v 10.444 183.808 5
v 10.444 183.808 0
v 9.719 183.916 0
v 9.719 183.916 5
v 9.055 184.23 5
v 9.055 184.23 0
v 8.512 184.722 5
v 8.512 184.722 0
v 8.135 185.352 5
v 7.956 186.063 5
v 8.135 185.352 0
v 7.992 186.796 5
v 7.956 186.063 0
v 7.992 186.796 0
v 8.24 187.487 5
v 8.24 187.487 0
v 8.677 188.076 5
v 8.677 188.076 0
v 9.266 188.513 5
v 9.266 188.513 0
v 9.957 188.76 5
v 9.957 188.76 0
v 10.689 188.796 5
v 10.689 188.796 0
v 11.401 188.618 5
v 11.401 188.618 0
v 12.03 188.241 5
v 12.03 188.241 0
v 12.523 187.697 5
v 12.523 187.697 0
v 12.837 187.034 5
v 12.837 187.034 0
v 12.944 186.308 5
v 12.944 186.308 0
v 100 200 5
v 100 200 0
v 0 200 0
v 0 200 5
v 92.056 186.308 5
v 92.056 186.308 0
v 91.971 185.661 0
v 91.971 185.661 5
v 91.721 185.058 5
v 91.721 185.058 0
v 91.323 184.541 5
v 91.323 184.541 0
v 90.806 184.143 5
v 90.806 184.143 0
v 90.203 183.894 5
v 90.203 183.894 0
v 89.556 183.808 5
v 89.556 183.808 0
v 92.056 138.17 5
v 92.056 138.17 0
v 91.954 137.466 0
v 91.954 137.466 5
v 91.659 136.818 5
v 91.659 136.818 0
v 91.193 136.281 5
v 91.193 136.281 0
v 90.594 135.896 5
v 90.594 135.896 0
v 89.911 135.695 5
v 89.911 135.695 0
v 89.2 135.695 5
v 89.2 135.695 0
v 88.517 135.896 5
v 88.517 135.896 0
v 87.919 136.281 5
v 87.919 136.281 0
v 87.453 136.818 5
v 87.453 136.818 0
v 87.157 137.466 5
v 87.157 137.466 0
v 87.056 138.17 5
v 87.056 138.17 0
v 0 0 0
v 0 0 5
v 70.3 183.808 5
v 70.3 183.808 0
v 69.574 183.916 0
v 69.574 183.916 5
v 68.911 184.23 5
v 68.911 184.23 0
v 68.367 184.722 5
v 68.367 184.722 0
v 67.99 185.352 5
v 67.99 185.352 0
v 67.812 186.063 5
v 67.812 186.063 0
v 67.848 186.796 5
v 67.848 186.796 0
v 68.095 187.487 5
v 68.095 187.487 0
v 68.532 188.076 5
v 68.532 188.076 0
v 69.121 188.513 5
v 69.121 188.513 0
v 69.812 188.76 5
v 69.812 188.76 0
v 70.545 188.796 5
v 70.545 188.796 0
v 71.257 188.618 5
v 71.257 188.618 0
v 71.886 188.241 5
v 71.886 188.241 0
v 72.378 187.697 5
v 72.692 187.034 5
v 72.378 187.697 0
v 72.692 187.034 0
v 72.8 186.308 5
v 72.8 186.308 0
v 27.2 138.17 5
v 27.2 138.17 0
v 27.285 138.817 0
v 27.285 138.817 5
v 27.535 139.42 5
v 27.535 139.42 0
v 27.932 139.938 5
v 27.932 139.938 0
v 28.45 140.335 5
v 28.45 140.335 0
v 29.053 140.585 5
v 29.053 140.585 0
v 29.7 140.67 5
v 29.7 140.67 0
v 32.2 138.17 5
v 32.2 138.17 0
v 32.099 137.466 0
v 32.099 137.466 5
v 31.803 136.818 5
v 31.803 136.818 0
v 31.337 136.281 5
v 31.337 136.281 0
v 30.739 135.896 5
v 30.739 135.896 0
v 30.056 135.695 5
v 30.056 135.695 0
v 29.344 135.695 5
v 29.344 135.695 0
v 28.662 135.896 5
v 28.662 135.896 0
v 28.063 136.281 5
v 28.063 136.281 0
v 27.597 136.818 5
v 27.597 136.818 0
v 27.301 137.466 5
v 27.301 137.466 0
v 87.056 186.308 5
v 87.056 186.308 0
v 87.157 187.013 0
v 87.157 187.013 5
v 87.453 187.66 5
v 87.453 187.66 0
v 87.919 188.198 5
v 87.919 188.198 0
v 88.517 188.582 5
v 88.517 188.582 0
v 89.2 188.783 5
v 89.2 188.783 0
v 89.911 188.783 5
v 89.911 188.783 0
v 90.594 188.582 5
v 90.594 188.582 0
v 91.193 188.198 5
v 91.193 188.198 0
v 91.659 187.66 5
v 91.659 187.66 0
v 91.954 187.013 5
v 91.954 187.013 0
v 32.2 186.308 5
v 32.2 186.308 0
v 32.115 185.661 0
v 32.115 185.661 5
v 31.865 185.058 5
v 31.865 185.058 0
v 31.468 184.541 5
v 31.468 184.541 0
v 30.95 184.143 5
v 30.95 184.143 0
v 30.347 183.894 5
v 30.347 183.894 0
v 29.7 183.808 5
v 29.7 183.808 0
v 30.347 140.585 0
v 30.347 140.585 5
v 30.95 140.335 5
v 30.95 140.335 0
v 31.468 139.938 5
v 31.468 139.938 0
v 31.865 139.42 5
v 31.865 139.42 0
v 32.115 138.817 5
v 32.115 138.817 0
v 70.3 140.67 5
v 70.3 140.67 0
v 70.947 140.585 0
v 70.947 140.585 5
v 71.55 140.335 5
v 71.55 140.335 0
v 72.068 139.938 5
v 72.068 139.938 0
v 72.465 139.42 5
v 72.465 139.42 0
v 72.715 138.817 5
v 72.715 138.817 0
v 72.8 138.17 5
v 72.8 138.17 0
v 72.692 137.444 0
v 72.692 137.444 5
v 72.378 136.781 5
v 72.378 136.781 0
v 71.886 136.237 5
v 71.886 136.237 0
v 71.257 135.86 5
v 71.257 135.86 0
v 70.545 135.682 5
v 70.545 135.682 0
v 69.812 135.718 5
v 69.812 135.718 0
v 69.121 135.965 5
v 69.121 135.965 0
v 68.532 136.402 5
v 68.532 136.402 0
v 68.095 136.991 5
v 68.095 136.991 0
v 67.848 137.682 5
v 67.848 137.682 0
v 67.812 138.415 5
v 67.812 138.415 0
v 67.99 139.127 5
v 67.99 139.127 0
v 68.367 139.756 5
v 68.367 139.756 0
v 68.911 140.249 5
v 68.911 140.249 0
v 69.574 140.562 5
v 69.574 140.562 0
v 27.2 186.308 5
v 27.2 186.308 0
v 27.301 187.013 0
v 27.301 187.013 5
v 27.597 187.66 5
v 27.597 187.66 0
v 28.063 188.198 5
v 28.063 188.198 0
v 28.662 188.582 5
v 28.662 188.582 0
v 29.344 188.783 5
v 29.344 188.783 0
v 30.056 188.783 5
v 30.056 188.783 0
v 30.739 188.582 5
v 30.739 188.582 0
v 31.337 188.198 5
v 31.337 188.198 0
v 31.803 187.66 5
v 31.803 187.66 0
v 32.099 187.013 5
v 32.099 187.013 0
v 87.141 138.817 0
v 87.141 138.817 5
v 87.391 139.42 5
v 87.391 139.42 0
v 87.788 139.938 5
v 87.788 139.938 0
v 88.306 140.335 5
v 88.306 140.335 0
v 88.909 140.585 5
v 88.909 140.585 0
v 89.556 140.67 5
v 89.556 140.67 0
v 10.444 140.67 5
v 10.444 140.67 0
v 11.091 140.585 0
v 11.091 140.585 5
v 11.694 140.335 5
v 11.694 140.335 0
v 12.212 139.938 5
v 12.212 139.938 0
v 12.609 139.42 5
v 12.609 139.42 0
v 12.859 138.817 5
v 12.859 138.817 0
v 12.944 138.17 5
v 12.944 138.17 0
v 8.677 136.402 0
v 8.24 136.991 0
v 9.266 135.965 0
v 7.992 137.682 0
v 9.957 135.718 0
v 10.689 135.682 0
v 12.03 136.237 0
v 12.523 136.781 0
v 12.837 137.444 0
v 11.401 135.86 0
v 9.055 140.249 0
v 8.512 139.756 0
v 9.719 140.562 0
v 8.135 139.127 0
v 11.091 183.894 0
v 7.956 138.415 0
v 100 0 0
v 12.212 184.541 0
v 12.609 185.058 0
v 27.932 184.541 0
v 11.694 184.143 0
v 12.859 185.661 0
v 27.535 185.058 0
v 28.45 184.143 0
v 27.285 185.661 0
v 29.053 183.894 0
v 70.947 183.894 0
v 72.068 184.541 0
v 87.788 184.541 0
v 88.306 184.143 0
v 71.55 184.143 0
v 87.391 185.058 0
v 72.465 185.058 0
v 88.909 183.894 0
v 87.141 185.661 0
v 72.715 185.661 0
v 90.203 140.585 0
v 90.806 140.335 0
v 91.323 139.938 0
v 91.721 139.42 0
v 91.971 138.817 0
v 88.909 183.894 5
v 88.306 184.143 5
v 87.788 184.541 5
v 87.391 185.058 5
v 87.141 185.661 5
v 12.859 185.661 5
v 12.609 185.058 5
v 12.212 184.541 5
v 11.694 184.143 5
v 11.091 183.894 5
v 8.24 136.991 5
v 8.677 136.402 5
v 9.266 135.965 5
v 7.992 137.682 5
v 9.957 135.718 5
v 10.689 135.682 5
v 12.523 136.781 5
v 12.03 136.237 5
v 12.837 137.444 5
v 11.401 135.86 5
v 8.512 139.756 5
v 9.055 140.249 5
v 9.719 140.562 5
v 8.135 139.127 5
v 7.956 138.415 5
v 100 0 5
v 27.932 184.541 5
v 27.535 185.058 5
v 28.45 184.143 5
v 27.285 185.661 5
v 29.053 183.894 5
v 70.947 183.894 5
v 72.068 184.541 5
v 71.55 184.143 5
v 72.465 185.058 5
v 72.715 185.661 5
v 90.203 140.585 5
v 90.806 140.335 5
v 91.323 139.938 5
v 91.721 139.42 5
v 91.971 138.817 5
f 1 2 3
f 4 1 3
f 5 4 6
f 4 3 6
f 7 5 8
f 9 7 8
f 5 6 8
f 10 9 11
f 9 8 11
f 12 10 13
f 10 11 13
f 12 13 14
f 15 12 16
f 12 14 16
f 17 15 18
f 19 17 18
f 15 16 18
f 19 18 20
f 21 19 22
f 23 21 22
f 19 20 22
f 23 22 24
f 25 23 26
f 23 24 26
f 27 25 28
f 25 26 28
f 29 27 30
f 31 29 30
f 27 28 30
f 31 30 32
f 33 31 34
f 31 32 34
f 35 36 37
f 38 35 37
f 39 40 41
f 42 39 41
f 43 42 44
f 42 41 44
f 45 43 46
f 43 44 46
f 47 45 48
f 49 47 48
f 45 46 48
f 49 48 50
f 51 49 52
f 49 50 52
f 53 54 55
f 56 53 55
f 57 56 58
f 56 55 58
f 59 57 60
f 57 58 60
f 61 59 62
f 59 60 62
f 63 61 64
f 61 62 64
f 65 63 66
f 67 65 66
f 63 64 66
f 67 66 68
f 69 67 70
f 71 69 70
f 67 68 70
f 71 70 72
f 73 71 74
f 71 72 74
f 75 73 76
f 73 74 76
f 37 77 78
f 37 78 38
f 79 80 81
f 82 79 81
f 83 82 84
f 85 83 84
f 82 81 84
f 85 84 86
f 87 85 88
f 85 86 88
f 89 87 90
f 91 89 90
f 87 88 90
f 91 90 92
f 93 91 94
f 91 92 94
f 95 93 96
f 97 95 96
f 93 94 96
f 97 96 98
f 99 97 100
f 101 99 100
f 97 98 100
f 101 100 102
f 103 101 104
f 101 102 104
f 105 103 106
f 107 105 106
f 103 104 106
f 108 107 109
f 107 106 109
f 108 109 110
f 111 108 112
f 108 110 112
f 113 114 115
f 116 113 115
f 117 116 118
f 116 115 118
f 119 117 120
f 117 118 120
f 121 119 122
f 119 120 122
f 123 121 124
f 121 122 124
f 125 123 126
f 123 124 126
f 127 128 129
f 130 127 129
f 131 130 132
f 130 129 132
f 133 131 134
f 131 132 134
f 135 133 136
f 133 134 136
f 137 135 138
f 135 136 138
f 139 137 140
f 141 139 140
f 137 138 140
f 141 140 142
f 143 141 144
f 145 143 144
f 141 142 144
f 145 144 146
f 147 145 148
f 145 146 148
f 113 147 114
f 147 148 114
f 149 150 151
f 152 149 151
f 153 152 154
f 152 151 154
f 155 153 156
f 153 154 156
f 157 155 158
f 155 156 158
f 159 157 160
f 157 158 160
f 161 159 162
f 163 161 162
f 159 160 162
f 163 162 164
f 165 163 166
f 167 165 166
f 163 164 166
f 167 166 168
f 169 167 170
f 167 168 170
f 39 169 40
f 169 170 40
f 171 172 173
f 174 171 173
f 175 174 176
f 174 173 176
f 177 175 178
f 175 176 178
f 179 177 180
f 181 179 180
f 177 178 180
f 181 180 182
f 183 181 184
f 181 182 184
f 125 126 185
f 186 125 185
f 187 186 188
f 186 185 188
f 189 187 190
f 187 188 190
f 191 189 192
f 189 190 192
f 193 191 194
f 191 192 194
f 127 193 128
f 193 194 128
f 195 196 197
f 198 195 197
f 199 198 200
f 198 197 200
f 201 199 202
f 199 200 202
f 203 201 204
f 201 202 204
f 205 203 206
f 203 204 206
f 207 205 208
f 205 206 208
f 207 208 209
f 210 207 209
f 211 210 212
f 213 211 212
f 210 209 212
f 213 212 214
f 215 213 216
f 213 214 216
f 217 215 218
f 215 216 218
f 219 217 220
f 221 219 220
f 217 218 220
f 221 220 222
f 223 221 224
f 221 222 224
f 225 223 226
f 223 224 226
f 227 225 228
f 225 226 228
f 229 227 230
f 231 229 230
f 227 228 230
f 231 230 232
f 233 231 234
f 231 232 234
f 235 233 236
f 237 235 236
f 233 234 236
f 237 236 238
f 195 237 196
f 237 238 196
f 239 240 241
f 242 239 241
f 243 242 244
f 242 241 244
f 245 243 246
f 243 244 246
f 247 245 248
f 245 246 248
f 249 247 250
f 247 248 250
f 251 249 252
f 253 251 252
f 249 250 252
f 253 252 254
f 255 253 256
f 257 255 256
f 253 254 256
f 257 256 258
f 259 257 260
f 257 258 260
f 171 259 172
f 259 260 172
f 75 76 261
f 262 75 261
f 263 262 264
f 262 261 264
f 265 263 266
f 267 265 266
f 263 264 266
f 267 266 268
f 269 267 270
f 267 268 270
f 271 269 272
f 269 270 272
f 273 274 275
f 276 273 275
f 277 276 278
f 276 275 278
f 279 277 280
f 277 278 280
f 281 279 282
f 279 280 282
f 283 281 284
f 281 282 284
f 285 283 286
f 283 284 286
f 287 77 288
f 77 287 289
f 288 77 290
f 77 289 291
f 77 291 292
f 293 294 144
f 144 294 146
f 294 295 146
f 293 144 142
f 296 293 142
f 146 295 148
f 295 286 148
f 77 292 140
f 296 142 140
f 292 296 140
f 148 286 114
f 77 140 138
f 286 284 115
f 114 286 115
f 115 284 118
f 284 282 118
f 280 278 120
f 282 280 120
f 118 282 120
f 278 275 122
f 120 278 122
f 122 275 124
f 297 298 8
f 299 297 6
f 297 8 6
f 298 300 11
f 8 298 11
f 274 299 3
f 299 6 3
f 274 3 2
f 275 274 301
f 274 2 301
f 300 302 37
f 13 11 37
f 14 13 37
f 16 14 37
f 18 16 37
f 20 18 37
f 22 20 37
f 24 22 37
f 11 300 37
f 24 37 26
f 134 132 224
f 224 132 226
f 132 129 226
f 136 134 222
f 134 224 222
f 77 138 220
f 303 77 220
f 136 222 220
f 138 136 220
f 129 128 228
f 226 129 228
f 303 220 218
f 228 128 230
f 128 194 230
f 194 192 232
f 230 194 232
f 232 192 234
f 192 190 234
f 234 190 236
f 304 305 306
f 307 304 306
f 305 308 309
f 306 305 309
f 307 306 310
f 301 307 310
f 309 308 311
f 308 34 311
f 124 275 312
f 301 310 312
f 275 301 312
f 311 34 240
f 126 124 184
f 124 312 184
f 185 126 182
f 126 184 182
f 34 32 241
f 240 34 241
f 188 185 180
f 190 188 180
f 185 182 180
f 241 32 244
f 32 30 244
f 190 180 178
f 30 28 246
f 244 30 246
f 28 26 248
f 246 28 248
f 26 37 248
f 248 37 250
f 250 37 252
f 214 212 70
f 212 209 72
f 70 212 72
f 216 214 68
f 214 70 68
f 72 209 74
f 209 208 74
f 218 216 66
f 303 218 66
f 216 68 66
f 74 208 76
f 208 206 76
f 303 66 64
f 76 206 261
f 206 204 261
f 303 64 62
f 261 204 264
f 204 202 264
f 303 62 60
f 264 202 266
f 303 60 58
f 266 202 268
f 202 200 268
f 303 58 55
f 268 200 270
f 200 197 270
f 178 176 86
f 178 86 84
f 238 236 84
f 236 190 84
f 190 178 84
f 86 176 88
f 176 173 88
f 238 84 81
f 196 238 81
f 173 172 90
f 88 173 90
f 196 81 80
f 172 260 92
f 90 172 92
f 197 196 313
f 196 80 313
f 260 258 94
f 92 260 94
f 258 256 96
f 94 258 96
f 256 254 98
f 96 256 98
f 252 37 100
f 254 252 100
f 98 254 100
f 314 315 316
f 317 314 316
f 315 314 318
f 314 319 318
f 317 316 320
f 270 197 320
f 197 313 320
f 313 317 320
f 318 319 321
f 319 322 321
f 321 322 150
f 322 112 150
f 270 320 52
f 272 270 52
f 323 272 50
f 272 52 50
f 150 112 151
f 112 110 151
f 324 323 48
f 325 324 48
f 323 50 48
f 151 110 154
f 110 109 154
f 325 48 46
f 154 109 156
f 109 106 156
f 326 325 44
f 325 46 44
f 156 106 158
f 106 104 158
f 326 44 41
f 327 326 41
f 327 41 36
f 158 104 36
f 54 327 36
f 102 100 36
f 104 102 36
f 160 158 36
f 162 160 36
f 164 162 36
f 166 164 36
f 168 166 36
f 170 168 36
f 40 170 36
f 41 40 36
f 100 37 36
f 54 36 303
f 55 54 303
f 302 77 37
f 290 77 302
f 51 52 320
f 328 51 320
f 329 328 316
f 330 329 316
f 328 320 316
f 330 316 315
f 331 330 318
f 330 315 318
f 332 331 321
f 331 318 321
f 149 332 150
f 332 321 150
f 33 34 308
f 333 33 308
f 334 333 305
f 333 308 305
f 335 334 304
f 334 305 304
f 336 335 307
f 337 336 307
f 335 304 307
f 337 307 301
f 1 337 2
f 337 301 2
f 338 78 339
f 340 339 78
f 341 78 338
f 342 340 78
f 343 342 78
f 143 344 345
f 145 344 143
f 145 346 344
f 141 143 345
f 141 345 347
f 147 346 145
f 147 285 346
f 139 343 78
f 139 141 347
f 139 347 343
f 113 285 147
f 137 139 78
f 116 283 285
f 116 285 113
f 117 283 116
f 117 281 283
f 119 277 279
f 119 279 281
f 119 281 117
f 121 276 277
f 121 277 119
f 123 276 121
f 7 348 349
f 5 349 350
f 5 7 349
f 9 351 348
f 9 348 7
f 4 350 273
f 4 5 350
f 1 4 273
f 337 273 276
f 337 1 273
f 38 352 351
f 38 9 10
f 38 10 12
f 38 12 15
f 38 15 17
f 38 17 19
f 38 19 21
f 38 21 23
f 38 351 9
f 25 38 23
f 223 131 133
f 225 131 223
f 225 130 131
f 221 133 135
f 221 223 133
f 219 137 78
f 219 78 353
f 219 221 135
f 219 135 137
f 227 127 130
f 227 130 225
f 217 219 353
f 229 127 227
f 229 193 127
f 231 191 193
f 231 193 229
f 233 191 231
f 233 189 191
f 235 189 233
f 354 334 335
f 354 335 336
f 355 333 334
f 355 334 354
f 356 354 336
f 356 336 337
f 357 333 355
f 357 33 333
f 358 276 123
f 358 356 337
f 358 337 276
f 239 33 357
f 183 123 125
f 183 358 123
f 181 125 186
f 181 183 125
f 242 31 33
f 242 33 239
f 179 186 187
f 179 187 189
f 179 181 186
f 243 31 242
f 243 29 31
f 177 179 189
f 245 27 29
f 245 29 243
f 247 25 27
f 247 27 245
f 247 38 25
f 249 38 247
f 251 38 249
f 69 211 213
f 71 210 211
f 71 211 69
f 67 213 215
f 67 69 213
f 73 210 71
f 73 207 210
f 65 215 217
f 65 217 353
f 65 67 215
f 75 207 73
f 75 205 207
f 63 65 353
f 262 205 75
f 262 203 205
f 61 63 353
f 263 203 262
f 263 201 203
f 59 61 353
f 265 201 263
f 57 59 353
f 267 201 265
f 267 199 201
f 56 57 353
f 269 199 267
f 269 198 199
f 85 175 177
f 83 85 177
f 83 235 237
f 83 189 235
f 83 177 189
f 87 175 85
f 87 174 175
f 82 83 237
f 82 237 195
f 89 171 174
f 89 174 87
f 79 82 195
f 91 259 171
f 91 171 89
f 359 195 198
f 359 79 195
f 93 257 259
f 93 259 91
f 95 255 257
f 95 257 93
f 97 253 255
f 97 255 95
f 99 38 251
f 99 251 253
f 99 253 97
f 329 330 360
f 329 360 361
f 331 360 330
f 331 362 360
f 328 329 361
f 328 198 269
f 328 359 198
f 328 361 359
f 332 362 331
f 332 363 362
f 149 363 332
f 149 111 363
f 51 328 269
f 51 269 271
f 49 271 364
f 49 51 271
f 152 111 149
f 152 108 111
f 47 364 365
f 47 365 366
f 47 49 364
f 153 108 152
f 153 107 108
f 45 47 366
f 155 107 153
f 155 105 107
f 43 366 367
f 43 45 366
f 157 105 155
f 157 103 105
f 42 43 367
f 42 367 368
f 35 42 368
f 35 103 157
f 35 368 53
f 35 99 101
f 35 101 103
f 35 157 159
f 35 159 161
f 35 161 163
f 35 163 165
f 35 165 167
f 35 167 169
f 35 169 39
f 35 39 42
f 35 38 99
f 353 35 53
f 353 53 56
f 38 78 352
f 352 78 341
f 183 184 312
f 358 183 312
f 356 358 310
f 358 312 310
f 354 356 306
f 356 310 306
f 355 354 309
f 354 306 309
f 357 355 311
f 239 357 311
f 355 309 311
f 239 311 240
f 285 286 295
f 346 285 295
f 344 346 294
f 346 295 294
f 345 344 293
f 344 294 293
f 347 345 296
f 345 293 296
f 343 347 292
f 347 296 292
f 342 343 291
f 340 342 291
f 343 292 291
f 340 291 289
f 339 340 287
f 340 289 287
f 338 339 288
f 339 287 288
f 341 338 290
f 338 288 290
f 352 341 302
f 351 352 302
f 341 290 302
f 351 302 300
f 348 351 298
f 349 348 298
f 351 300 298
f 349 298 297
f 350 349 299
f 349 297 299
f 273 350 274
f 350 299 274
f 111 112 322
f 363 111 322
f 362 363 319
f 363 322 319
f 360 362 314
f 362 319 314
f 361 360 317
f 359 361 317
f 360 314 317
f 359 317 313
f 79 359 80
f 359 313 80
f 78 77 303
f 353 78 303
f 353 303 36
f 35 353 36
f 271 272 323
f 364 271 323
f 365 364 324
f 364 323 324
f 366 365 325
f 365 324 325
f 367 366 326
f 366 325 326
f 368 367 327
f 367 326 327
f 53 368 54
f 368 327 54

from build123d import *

# Parameters (mm, degrees)
F0_W     = 50
F0_H     = 200
F1_DEPTH = 5


with BuildPart() as f1:
    # F0 (on Top) → F1 (new body)
    with BuildSketch(Plane.XY):
        with Locations((75, 100)):
            Rectangle(F0_W, F0_H)
        with BuildLine():
            Line((87.0556895062, 138.1699442863), (72.7997934073, 138.1699442863))
            ThreePointArc((72.7997934073, 138.1699442863), (68.5320264544, 136.4021773334), (70.2997934073, 140.6699442863))
            Line((70.2997934073, 140.6699442863), (70.2997934073, 183.8083988428))
            ThreePointArc((70.2997934073, 183.8083988428), (68.5320264544, 188.0761657958), (72.7997934073, 186.3083988428))
            Line((72.7997934073, 186.3083988428), (87.0556895062, 186.3083988428))
            ThreePointArc((87.0556895062, 186.3083988428), (89.5556895062, 188.8083988428), (92.0556895062, 186.3083988428))
            ThreePointArc((92.0556895062, 186.3083988428), (91.3234564592, 184.5406318898), (89.5556895062, 183.8083988428))
            Line((89.5556895062, 183.8083988428), (89.5556895062, 140.6699442863))
            ThreePointArc((89.5556895062, 140.6699442863), (91.3234564592, 139.9377112393), (92.0556895062, 138.1699442863))
            ThreePointArc((92.0556895062, 138.1699442863), (89.5556895062, 135.6699442863), (87.0556895062, 138.1699442863))
        make_face(mode=Mode.SUBTRACT)
        with Locations((25, 100)):
            Rectangle(F0_W, F0_H)
        with BuildLine():
            ThreePointArc((10.4443104938, 183.8083988428), (8.6765435408, 188.0761657958), (12.9443104938, 186.3083988428))
            Line((12.9443104938, 186.3083988428), (27.2002065927, 186.3083988428))
            ThreePointArc((27.2002065927, 186.3083988428), (29.7002065927, 188.8083988428), (32.2002065927, 186.3083988428))
            ThreePointArc((32.2002065927, 186.3083988428), (31.4679735456, 184.5406318898), (29.7002065927, 183.8083988428))
            Line((29.7002065927, 183.8083988428), (29.7002065927, 140.6699442863))
            ThreePointArc((29.7002065927, 140.6699442863), (31.4679735456, 139.9377112393), (32.2002065927, 138.1699442863))
            ThreePointArc((32.2002065927, 138.1699442863), (29.7002065927, 135.6699442863), (27.2002065927, 138.1699442863))
            Line((27.2002065927, 138.1699442863), (12.9443104938, 138.1699442863))
            ThreePointArc((12.9443104938, 138.1699442863), (8.6765435408, 136.4021773334), (10.4443104938, 140.6699442863))
            Line((10.4443104938, 140.6699442863), (10.4443104938, 183.8083988428))
        make_face(mode=Mode.SUBTRACT)
        with BuildLine():
            Line((27.2002065927, 186.3083988428), (12.9443104938, 186.3083988428))
            ThreePointArc((12.9443104938, 186.3083988428), (12.2120774467, 184.5406318898), (10.4443104938, 183.8083988428))
            Line((10.4443104938, 183.8083988428), (10.4443104938, 140.6699442863))
            ThreePointArc((10.4443104938, 140.6699442863), (12.2120774467, 139.9377112393), (12.9443104938, 138.1699442863))
            Line((12.9443104938, 138.1699442863), (27.2002065927, 138.1699442863))
            ThreePointArc((27.2002065927, 138.1699442863), (27.9324396397, 139.9377112393), (29.7002065927, 140.6699442863))
            Line((29.7002065927, 140.6699442863), (29.7002065927, 183.8083988428))
            ThreePointArc((29.7002065927, 183.8083988428), (27.9324396397, 184.5406318898), (27.2002065927, 186.3083988428))
        make_face()
        with BuildLine():
            ThreePointArc((70.2997934073, 140.6699442863), (72.0675603603, 139.9377112393), (72.7997934073, 138.1699442863))
            Line((72.7997934073, 138.1699442863), (87.0556895062, 138.1699442863))
            ThreePointArc((87.0556895062, 138.1699442863), (87.7879225533, 139.9377112393), (89.5556895062, 140.6699442863))
            Line((89.5556895062, 140.6699442863), (89.5556895062, 183.8083988428))
            ThreePointArc((89.5556895062, 183.8083988428), (87.7879225533, 184.5406318898), (87.0556895062, 186.3083988428))
            Line((87.0556895062, 186.3083988428), (72.7997934073, 186.3083988428))
            ThreePointArc((72.7997934073, 186.3083988428), (72.0675603603, 184.5406318898), (70.2997934073, 183.8083988428))
            Line((70.2997934073, 183.8083988428), (70.2997934073, 140.6699442863))
        make_face()
    extrude(amount=F1_DEPTH)


solid = f1.part
